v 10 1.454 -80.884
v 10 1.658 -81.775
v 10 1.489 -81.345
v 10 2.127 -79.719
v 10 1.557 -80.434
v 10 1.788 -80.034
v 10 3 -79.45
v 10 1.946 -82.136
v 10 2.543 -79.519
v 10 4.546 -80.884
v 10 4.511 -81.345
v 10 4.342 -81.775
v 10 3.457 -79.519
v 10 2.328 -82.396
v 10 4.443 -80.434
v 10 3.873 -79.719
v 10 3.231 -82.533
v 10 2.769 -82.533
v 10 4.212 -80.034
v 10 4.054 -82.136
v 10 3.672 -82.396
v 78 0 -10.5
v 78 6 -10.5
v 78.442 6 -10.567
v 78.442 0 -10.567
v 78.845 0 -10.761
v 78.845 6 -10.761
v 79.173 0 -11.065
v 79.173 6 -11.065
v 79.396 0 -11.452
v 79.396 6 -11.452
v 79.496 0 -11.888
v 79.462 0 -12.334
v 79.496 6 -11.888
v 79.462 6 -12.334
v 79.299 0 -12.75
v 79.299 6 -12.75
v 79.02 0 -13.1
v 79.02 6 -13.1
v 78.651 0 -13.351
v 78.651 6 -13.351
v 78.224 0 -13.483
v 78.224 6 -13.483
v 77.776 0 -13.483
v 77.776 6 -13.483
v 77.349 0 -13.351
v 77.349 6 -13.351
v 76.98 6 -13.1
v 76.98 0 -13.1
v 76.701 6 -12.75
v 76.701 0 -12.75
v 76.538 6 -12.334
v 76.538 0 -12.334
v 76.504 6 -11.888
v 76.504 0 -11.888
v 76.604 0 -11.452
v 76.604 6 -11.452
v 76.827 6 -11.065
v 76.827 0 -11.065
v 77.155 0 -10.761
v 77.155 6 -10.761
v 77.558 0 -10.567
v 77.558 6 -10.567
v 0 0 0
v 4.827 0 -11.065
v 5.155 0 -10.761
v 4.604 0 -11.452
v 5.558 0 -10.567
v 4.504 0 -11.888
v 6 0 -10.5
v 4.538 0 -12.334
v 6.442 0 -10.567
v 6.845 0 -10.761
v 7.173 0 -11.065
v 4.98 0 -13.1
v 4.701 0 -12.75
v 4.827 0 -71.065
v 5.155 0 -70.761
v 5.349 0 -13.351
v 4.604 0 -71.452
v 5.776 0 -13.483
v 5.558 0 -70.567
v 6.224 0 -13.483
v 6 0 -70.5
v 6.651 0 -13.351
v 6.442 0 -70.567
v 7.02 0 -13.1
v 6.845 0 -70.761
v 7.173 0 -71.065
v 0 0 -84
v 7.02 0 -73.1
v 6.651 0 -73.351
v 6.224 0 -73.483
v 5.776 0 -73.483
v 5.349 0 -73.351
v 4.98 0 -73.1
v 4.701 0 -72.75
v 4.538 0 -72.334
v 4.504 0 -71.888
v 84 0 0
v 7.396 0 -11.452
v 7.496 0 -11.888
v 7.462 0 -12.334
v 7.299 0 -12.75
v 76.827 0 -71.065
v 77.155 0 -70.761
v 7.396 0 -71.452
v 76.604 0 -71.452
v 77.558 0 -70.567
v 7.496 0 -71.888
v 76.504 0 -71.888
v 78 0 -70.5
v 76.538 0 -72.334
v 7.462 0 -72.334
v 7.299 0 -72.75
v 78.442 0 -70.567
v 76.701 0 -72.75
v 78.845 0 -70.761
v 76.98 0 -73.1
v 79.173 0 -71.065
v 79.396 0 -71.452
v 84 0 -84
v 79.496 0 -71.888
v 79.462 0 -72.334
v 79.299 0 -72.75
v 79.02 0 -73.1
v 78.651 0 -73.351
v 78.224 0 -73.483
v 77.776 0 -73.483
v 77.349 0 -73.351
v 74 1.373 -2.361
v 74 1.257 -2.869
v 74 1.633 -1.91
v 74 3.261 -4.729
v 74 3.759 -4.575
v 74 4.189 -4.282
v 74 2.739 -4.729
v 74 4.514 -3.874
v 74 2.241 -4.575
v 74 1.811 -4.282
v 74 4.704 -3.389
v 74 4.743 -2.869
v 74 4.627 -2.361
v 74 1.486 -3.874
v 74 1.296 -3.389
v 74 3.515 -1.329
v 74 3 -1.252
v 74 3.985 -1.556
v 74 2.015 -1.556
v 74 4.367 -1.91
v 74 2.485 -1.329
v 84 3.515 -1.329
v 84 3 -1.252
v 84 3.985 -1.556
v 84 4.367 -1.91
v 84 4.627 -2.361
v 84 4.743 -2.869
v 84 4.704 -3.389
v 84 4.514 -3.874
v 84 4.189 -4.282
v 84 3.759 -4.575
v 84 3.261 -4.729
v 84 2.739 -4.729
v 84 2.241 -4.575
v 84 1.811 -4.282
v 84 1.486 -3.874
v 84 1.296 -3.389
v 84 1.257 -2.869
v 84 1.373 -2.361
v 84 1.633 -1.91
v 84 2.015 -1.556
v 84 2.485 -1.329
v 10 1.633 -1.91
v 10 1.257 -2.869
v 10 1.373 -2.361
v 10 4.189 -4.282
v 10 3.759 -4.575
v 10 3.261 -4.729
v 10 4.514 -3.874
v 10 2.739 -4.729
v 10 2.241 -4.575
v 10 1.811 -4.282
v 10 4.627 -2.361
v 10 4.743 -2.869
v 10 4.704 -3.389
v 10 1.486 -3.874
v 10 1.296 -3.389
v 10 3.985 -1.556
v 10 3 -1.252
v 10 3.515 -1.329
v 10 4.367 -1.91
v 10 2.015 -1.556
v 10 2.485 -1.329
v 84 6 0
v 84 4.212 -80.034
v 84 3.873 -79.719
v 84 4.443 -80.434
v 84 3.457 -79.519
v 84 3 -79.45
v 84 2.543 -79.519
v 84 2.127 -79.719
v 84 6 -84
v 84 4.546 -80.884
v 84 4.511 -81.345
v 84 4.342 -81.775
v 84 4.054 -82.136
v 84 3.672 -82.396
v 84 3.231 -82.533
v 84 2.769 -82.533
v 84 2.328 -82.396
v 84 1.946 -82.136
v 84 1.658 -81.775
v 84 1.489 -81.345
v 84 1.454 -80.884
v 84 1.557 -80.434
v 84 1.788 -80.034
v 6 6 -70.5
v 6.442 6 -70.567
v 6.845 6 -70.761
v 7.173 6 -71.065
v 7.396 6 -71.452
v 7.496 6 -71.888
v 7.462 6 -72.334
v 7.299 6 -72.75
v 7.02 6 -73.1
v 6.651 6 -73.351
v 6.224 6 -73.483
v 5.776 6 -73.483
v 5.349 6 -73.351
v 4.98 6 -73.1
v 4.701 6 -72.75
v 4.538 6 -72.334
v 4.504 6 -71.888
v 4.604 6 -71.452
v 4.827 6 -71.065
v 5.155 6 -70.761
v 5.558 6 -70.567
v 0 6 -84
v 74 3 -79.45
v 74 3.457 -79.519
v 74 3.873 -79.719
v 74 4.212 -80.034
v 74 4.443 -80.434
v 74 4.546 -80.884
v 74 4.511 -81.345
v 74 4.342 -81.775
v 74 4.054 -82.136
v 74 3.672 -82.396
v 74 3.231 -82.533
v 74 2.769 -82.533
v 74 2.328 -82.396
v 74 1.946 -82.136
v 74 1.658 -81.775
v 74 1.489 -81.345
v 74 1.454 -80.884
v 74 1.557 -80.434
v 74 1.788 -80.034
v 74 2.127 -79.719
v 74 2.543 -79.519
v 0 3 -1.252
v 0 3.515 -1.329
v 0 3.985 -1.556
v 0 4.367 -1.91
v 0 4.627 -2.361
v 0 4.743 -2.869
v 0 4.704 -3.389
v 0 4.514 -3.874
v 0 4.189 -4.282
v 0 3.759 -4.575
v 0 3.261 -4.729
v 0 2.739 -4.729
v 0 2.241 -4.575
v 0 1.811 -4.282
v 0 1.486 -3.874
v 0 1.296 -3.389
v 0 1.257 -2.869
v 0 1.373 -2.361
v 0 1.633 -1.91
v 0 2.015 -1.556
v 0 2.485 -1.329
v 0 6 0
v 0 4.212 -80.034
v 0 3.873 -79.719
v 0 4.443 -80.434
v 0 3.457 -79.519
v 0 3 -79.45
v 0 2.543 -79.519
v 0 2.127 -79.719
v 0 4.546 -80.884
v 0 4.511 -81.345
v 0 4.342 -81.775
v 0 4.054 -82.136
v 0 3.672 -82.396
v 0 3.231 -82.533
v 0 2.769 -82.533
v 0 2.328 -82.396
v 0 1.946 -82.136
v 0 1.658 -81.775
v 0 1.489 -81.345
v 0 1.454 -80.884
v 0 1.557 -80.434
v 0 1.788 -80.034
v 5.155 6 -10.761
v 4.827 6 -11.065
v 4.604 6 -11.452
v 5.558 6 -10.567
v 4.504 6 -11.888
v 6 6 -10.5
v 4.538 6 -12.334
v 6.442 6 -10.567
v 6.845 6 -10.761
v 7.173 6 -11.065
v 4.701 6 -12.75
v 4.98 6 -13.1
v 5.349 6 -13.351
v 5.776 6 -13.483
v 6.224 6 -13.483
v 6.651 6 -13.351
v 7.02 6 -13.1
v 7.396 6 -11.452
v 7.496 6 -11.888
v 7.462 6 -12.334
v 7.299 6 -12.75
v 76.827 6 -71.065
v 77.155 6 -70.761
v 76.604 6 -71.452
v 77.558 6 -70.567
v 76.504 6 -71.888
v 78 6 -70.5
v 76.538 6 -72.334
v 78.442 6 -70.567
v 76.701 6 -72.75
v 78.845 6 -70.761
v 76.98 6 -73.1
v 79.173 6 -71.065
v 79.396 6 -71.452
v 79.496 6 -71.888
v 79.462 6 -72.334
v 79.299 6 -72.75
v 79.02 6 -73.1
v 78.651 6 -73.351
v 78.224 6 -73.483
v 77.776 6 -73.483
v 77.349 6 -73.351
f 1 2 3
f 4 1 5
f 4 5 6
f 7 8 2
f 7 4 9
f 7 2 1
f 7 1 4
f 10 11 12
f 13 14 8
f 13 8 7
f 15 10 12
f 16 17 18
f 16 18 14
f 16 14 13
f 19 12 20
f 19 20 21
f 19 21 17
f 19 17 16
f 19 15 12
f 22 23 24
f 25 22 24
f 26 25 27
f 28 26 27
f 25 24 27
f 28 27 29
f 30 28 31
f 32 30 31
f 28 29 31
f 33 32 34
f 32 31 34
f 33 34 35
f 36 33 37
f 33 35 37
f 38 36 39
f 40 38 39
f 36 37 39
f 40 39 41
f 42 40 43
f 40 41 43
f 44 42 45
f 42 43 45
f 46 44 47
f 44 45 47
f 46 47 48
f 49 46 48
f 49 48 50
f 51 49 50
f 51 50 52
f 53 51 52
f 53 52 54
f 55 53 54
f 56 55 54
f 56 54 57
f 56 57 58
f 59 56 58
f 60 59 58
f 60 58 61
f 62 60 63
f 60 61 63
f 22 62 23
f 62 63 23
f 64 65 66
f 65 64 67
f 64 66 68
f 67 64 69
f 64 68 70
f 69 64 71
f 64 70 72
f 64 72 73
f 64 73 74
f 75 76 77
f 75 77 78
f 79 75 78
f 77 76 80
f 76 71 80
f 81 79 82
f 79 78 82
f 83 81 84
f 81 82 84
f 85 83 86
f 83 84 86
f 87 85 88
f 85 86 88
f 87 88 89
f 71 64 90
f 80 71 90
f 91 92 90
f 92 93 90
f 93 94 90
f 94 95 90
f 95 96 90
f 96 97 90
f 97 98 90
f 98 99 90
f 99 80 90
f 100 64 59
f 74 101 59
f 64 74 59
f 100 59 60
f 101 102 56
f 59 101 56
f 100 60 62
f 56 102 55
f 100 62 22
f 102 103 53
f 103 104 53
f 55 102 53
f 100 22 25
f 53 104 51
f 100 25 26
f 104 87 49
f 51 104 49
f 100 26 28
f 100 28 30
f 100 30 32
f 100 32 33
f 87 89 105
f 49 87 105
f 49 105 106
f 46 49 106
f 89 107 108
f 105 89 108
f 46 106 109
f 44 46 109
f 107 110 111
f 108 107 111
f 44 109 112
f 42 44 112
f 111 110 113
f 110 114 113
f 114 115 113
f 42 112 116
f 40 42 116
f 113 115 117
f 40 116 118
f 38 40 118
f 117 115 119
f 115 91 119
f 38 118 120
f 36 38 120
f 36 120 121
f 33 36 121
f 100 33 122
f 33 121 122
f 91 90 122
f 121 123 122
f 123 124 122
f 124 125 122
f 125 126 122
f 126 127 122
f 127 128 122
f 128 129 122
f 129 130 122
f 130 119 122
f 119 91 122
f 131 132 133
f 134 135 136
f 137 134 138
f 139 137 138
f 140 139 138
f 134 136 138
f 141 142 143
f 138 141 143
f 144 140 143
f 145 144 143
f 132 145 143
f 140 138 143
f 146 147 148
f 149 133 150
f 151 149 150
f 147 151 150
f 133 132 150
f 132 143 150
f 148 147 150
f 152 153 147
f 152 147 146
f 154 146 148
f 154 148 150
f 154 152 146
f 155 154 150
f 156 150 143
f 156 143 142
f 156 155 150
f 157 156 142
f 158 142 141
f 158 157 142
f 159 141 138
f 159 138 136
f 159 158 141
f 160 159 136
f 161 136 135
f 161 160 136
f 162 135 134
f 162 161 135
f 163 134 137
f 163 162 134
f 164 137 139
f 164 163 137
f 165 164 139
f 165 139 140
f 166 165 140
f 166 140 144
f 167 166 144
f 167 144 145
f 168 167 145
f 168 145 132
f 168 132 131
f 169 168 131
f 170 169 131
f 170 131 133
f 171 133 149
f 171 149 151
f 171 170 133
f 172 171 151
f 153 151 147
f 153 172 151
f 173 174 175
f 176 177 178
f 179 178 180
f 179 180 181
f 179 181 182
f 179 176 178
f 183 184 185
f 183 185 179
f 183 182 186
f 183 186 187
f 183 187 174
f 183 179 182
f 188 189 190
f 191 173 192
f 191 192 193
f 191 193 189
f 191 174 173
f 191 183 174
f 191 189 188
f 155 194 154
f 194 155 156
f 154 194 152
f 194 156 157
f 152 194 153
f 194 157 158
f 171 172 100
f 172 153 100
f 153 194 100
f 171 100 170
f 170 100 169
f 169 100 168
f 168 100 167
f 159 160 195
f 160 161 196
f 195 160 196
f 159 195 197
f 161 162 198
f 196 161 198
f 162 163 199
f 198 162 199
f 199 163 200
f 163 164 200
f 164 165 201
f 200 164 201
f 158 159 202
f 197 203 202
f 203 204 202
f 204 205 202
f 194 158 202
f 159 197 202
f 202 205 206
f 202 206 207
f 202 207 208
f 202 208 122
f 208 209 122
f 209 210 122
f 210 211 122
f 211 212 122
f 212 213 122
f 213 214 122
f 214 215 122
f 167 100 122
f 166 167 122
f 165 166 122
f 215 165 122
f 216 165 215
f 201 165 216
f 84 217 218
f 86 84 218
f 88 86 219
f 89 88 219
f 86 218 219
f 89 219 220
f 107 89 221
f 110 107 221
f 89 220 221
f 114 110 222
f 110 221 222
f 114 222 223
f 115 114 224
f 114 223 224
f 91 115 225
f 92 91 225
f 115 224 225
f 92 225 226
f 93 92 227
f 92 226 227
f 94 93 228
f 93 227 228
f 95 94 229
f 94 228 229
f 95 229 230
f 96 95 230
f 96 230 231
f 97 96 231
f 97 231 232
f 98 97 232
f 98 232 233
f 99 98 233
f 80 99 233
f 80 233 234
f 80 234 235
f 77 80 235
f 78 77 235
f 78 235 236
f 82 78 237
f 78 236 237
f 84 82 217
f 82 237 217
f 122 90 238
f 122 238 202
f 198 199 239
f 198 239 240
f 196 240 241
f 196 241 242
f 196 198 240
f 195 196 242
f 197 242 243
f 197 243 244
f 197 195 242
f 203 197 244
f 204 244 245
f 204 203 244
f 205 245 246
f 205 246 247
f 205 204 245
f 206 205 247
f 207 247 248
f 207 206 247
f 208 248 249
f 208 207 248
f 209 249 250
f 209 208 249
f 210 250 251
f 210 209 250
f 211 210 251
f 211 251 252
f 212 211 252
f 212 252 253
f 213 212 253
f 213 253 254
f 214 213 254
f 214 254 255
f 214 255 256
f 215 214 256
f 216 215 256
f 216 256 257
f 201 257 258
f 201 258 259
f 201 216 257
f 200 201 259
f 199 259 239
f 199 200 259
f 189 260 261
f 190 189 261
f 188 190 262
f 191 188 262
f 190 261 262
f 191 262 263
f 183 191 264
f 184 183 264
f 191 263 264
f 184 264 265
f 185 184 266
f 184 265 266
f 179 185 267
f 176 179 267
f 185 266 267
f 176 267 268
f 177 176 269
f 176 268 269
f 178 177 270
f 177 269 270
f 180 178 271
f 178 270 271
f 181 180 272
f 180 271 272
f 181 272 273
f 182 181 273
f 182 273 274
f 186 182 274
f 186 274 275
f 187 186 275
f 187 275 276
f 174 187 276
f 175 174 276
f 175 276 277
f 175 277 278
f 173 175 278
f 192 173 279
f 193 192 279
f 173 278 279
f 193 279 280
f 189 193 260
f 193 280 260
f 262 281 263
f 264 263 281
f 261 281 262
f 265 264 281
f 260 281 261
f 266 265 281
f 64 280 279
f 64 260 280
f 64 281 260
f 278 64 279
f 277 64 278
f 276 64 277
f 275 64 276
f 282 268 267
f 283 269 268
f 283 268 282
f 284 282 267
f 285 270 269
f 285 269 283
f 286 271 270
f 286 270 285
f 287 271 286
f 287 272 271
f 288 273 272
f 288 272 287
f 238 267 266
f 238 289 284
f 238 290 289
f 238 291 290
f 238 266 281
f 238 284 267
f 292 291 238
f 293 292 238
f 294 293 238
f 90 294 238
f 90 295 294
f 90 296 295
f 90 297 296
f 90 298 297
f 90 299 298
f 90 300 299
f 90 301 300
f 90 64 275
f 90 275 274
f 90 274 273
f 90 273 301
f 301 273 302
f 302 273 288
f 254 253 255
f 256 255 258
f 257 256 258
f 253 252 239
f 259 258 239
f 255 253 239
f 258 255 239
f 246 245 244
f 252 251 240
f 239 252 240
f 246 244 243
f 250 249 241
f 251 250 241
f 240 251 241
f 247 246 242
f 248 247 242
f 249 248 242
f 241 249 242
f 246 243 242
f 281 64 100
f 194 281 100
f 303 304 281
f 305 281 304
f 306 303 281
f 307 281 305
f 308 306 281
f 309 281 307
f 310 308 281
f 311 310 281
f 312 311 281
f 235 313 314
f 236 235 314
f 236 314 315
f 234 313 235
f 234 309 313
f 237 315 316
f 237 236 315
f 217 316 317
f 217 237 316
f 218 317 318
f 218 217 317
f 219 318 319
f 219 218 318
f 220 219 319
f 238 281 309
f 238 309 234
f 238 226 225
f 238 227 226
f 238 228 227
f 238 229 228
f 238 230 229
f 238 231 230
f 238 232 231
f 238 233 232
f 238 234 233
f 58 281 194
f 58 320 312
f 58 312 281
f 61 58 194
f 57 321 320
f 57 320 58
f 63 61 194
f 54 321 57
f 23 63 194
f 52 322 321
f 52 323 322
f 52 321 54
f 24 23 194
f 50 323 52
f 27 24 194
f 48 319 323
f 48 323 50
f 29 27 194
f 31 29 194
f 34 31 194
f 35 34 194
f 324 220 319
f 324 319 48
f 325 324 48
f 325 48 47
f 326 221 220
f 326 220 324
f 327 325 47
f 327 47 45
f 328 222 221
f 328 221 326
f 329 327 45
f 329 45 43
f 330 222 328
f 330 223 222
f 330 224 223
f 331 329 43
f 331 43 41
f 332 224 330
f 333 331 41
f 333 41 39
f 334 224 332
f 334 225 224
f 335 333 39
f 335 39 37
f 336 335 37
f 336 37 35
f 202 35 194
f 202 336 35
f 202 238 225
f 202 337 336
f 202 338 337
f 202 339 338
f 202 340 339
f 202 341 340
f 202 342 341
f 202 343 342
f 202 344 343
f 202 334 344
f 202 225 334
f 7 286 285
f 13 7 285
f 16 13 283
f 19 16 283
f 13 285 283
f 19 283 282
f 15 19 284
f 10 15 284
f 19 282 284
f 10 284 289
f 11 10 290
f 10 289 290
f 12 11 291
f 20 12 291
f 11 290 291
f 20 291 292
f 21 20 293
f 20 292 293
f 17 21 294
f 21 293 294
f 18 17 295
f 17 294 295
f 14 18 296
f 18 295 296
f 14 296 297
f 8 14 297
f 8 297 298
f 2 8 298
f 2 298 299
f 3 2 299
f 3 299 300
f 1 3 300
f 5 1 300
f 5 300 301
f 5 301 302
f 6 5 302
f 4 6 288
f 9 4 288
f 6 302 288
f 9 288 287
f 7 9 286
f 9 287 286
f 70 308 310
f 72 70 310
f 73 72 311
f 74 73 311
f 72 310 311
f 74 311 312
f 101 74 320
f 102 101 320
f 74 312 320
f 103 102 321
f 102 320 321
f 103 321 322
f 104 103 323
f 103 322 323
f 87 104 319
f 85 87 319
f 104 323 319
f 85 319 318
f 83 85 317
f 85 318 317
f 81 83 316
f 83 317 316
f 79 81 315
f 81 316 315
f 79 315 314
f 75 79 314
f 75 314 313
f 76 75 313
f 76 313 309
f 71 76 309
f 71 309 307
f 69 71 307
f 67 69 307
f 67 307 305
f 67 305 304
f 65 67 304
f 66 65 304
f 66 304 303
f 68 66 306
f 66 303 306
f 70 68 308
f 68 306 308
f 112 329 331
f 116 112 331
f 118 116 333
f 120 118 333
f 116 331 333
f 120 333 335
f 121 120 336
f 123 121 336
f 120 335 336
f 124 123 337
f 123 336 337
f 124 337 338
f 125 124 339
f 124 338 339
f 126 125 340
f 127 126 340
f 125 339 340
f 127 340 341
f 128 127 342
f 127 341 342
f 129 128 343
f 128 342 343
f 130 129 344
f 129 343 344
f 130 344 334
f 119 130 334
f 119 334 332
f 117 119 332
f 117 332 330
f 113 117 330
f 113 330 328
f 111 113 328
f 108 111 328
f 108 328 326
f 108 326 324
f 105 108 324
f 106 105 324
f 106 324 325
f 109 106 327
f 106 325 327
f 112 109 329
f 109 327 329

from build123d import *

# Parameters (mm, degrees)
SKETCH1_W            = 84
SKETCH1_H            = 84
BOSS_EXTRUDE1_DEPTH  = 6
SKETCH2_R            = 1.5
CUT_EXTRUDE1_DEPTH   = 6
LPATTERN1_COUNT      = 2
LPATTERN1_PITCH      = 72
LPATTERN1_COUNT_DIR2 = 2
LPATTERN1_PITCH_DIR2 = 60
SKETCH3_R            = 1.549904247
SKETCH3_R_2          = 1.748244363
CUT_EXTRUDE2_DEPTH   = 10


with BuildPart() as part:
    # Sketch1 → Boss-Extrude1 (new body)
    with BuildSketch(Plane(origin=(0, 0, 0), x_dir=(1, 0, 0), z_dir=(0, 1, 0))):
        with Locations((42, 42)):
            Rectangle(SKETCH1_W, SKETCH1_H)
    extrude(amount=BOSS_EXTRUDE1_DEPTH)

    # Sketch2 → Cut-Extrude1 (cut)
    with BuildSketch(Plane(origin=(0, 6, 0), x_dir=(1, 0, 0), z_dir=(0, 1, 0))):
        with Locations(Location((6, 72, 0), (0, 0, 270))):
            Circle(SKETCH2_R)
    cut_extrude1 = extrude(amount=-CUT_EXTRUDE1_DEPTH, mode=Mode.SUBTRACT)

    # LPattern1: Cut-Extrude1 2 × 2
    with Locations(*[(i * LPATTERN1_PITCH, 0, j * LPATTERN1_PITCH_DIR2) for i in range(LPATTERN1_COUNT) for j in range(LPATTERN1_COUNT_DIR2) if (i, j) != (0, 0)]):
        add(cut_extrude1, mode=Mode.SUBTRACT)

    # Sketch3 → Cut-Extrude2 (cut)
    with BuildSketch(Plane.ZY):
        with Locations((-81, 3)):
            Circle(SKETCH3_R)
        with Locations((-3, 3)):
            Circle(SKETCH3_R_2)
    cut_extrude2 = extrude(amount=-CUT_EXTRUDE2_DEPTH, mode=Mode.SUBTRACT)

    # Mirror1: Cut-Extrude2 across plane
    add(cut_extrude2.mirror(Plane.ZY.offset(-42)), mode=Mode.SUBTRACT)


solid = part.part
